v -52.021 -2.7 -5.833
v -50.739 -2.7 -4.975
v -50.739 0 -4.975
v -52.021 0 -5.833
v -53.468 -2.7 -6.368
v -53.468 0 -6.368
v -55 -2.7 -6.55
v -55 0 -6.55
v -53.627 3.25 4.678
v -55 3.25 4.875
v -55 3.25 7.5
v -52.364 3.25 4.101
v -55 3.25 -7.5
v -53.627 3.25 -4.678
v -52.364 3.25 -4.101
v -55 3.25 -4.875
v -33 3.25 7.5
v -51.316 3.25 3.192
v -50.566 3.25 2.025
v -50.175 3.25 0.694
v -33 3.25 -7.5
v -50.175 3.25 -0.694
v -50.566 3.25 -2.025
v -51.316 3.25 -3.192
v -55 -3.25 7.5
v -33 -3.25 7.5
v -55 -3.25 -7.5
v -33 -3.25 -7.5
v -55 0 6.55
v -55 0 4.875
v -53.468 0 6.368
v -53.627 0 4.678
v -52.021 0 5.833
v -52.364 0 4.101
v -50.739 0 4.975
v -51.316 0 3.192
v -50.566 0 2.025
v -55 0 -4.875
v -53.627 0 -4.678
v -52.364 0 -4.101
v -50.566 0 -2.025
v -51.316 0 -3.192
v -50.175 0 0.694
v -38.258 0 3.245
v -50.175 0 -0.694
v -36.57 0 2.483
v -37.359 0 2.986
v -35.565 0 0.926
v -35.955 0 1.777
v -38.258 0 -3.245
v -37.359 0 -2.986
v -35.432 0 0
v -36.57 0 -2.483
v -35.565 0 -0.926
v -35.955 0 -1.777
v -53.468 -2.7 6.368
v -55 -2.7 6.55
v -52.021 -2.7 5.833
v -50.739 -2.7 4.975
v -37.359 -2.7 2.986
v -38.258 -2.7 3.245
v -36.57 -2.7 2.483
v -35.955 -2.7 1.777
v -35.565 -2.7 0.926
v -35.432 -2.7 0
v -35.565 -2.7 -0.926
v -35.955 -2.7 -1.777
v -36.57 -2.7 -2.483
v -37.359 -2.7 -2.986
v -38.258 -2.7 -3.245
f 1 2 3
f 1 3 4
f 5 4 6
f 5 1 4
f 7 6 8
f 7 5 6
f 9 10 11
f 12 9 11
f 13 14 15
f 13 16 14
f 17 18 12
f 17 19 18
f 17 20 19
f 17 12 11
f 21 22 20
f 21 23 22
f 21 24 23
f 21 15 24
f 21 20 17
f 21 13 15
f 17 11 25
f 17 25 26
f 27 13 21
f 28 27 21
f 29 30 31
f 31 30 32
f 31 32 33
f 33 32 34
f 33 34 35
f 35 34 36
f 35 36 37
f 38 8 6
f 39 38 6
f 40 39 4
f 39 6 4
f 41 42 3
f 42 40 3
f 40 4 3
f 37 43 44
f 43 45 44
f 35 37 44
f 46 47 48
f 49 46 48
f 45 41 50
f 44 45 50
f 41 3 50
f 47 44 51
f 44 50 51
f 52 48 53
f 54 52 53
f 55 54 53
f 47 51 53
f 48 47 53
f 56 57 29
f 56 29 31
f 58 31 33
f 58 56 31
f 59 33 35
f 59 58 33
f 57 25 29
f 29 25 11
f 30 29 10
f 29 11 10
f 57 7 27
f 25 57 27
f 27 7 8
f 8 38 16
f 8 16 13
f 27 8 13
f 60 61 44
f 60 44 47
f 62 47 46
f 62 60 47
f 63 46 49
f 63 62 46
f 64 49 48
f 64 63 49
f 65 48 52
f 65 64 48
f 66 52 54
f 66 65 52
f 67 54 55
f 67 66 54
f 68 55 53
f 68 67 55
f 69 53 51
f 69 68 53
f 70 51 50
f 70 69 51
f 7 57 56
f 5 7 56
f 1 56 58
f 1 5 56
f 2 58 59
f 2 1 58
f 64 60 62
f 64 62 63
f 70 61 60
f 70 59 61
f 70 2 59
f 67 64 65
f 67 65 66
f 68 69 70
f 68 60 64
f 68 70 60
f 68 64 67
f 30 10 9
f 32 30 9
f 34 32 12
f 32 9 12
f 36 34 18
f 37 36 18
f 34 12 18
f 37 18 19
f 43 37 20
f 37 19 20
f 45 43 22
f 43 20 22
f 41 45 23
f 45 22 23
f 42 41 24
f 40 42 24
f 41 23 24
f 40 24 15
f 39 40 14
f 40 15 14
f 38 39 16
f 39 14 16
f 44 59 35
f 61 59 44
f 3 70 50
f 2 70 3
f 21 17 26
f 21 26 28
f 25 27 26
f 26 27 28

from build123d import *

# Parameters (mm, degrees)
SKETCH2_W           = 110
SKETCH2_H           = 15
BOSS_EXTRUDE1_DEPTH = 3.25
CAVITY1_START       = -2.5
CAVITY1_DEPTH       = 2.5
CAVITY1_START_2     = -1.5
CAVITY1_2_DEPTH     = 4.75
CAVITY1_3_DEPTH     = 1.5
CUT_EXTRUDE1_START  = -5.75
CUT_EXTRUDE1_DEPTH  = 5.75
CUT_EXTRUDE2_START  = -1
CUT_EXTRUDE2_DEPTH  = 1
CUT_EXTRUDE3_START  = -0.2
CUT_EXTRUDE3_DEPTH  = 2.7
CUT_EXTRUDE4_REACH  = 57.888
SKETCH9_W           = 88
SKETCH9_H           = 15
CUT_EXTRUDE5_DEPTH  = 56.888281419


# Read off the part's stored shape, not the designer's step: Cavity1
with BuildPart() as part:
    # Sketch2 → Boss-Extrude1 (new, symmetric)
    with BuildSketch(Plane(origin=(0, 0, 0), x_dir=(1, 0, 0), z_dir=(0, 1, 0))):
        Rectangle(SKETCH2_W, SKETCH2_H)
    extrude(amount=BOSS_EXTRUDE1_DEPTH, both=True)

    # Cavity1 outline → Cavity1 (cut)
    with BuildSketch(Plane(origin=(0, 0, 0), x_dir=(1, 0, 0), z_dir=(0, 1, 0)).offset(CAVITY1_START)):
        with BuildLine():
            ThreePointArc((-55, 2.875), (-52.125, 0), (-55, -2.875))
            Line((-55, -2.875), (-55, -3.425))
            ThreePointArc((-55, -3.425), (-51.575, 0), (-55, 3.425))
            Line((-55, 3.425), (-55, 2.875))
        make_face()
        with BuildLine():
            Line((-55, 6.05), (-55, 4.5))
            ThreePointArc((-55, 4.5), (-50.5, 0), (-55, -4.5))
            Line((-55, -4.5), (-55, -6.05))
            ThreePointArc((-55, -6.05), (-52.834647835, -5.649225611), (-50.956177551, -4.5))
            Line((-50.956177551, -4.5), (-38.326846611, -2.75))
            ThreePointArc((-38.326846611, -2.75), (-35.931628674, 0), (-38.326846611, 2.75))
            Line((-38.326846611, 2.75), (-50.956177551, 4.5))
            ThreePointArc((-50.956177551, 4.5), (-52.834647835, 5.649225611), (-55, 6.05))
        make_face()
    extrude(amount=CAVITY1_DEPTH, mode=Mode.SUBTRACT)

    # Cavity1 2 outline → Cavity1 2 (cut)
    with BuildSketch(Plane(origin=(0, 0, 0), x_dir=(1, 0, 0), z_dir=(0, 1, 0)).offset(CAVITY1_START_2)):
        with BuildLine():
            ThreePointArc((-55, 3), (-52, 0), (-55, -3))
            Line((-55, -3), (-55, -4.375))
            ThreePointArc((-55, -4.375), (-50.625, 0), (-55, 4.375))
            Line((-55, 4.375), (-55, 3))
        make_face()
    extrude(amount=CAVITY1_2_DEPTH, mode=Mode.SUBTRACT)

    # Cavity1 3 outline → Cavity1 3 (cut)
    with BuildSketch(Plane(origin=(0, 0, 0), x_dir=(1, 0, 0), z_dir=(0, 1, 0)).offset(CAVITY1_START_2)):
        with BuildLine():
            Line((-55, 2.875), (-55, 1.5))
            ThreePointArc((-55, 1.5), (-53.5, 0), (-55, -1.5))
            Line((-55, -1.5), (-55, -2.875))
            ThreePointArc((-55, -2.875), (-52.125, 0), (-55, 2.875))
        make_face()
        with BuildLine():
            Line((-55, 4.5), (-55, 4.375))
            ThreePointArc((-55, 4.375), (-50.625, 0), (-55, -4.375))
            Line((-55, -4.375), (-55, -4.5))
            ThreePointArc((-55, -4.5), (-50.5, 0), (-55, 4.5))
        make_face()
    extrude(amount=CAVITY1_3_DEPTH, mode=Mode.SUBTRACT)

    # Sketch4 → Cut-Extrude1 (cut)
    with BuildSketch(Plane(origin=(0, 3.25, 0), x_dir=(1, 0, 0), z_dir=(0, 1, 0)).offset(CUT_EXTRUDE1_START)):
        with BuildLine():
            Line((-55, 3), (-55, -3))
            ThreePointArc((-55, -3), (-52, 0), (-55, 3))
        make_face()
    extrude(amount=CUT_EXTRUDE1_DEPTH, mode=Mode.SUBTRACT)

    # Sketch6 → Cut-Extrude2 (cut)
    with BuildSketch(Plane(origin=(0, -1.5, 0), x_dir=(1, 0, 0), z_dir=(0, 1, 0)).offset(CUT_EXTRUDE2_START)):
        with BuildLine():
            Line((-55, 4.5), (-55, 3.425))
            ThreePointArc((-55, 3.425), (-51.575, 0), (-55, -3.425))
            Line((-55, -3.425), (-55, -4.5))
            ThreePointArc((-55, -4.5), (-50.5, 0), (-55, 4.5))
        make_face()
    extrude(amount=CUT_EXTRUDE2_DEPTH, mode=Mode.SUBTRACT)

    # Sketch7 → Cut-Extrude3 (cut)
    with BuildSketch(Plane(origin=(0, -2.5, 0), x_dir=(1, 0, 0), z_dir=(0, 1, 0)).offset(CUT_EXTRUDE3_START)):
        with BuildLine():
            Line((-38.25821916, 3.24526788), (-50.739154033, 4.974705182))
            ThreePointArc((-50.739154033, 4.974705182), (-52.964952838, 6.225839947), (-55.5, 6.530888148))
            Line((-55.5, 6.530888148), (-55.5, -6.530888148))
            ThreePointArc((-55.5, -6.530888148), (-52.964952838, -6.225839947), (-50.739154033, -4.974705182))
            Line((-50.739154033, -4.974705182), (-38.25821916, -3.24526788))
            ThreePointArc((-38.25821916, -3.24526788), (-35.431628674, 0), (-38.25821916, 3.24526788))
        make_face()
    extrude(amount=CUT_EXTRUDE3_DEPTH, mode=Mode.SUBTRACT)

    # Sketch8 → Cut-Extrude4 (cut, up to next)
    with BuildSketch(Plane(origin=(0, 3.25, 0), x_dir=(1, 0, 0), z_dir=(0, 1, 0)), mode=Mode.PRIVATE) as cut_extrude4_sk1:
        with BuildLine():
            ThreePointArc((-55, 4.375), (-50.625, 0), (-55, -4.375))
            Line((-55, -4.375), (-55, -4.875))
            ThreePointArc((-55, -4.875), (-50.125, 0), (-55, 4.875))
            Line((-55, 4.875), (-55, 4.375))
        make_face()
    cut_extrude4_tool1 = extrude(cut_extrude4_sk1.sketch, amount=-CUT_EXTRUDE4_REACH, mode=Mode.PRIVATE) & part.part
    add(cut_extrude4_tool1.solids().sort_by_distance((-50.515992, 3.25, 0))[0], mode=Mode.SUBTRACT)

    # Sketch9 → Cut-Extrude5 (cut, through all)
    with BuildSketch(Plane(origin=(0, 3.25, 0), x_dir=(1, 0, 0), z_dir=(0, 1, 0))):
        with Locations((11, 0)):
            Rectangle(SKETCH9_W, SKETCH9_H)
    extrude(amount=-CUT_EXTRUDE5_DEPTH, mode=Mode.SUBTRACT)


solid = part.part
